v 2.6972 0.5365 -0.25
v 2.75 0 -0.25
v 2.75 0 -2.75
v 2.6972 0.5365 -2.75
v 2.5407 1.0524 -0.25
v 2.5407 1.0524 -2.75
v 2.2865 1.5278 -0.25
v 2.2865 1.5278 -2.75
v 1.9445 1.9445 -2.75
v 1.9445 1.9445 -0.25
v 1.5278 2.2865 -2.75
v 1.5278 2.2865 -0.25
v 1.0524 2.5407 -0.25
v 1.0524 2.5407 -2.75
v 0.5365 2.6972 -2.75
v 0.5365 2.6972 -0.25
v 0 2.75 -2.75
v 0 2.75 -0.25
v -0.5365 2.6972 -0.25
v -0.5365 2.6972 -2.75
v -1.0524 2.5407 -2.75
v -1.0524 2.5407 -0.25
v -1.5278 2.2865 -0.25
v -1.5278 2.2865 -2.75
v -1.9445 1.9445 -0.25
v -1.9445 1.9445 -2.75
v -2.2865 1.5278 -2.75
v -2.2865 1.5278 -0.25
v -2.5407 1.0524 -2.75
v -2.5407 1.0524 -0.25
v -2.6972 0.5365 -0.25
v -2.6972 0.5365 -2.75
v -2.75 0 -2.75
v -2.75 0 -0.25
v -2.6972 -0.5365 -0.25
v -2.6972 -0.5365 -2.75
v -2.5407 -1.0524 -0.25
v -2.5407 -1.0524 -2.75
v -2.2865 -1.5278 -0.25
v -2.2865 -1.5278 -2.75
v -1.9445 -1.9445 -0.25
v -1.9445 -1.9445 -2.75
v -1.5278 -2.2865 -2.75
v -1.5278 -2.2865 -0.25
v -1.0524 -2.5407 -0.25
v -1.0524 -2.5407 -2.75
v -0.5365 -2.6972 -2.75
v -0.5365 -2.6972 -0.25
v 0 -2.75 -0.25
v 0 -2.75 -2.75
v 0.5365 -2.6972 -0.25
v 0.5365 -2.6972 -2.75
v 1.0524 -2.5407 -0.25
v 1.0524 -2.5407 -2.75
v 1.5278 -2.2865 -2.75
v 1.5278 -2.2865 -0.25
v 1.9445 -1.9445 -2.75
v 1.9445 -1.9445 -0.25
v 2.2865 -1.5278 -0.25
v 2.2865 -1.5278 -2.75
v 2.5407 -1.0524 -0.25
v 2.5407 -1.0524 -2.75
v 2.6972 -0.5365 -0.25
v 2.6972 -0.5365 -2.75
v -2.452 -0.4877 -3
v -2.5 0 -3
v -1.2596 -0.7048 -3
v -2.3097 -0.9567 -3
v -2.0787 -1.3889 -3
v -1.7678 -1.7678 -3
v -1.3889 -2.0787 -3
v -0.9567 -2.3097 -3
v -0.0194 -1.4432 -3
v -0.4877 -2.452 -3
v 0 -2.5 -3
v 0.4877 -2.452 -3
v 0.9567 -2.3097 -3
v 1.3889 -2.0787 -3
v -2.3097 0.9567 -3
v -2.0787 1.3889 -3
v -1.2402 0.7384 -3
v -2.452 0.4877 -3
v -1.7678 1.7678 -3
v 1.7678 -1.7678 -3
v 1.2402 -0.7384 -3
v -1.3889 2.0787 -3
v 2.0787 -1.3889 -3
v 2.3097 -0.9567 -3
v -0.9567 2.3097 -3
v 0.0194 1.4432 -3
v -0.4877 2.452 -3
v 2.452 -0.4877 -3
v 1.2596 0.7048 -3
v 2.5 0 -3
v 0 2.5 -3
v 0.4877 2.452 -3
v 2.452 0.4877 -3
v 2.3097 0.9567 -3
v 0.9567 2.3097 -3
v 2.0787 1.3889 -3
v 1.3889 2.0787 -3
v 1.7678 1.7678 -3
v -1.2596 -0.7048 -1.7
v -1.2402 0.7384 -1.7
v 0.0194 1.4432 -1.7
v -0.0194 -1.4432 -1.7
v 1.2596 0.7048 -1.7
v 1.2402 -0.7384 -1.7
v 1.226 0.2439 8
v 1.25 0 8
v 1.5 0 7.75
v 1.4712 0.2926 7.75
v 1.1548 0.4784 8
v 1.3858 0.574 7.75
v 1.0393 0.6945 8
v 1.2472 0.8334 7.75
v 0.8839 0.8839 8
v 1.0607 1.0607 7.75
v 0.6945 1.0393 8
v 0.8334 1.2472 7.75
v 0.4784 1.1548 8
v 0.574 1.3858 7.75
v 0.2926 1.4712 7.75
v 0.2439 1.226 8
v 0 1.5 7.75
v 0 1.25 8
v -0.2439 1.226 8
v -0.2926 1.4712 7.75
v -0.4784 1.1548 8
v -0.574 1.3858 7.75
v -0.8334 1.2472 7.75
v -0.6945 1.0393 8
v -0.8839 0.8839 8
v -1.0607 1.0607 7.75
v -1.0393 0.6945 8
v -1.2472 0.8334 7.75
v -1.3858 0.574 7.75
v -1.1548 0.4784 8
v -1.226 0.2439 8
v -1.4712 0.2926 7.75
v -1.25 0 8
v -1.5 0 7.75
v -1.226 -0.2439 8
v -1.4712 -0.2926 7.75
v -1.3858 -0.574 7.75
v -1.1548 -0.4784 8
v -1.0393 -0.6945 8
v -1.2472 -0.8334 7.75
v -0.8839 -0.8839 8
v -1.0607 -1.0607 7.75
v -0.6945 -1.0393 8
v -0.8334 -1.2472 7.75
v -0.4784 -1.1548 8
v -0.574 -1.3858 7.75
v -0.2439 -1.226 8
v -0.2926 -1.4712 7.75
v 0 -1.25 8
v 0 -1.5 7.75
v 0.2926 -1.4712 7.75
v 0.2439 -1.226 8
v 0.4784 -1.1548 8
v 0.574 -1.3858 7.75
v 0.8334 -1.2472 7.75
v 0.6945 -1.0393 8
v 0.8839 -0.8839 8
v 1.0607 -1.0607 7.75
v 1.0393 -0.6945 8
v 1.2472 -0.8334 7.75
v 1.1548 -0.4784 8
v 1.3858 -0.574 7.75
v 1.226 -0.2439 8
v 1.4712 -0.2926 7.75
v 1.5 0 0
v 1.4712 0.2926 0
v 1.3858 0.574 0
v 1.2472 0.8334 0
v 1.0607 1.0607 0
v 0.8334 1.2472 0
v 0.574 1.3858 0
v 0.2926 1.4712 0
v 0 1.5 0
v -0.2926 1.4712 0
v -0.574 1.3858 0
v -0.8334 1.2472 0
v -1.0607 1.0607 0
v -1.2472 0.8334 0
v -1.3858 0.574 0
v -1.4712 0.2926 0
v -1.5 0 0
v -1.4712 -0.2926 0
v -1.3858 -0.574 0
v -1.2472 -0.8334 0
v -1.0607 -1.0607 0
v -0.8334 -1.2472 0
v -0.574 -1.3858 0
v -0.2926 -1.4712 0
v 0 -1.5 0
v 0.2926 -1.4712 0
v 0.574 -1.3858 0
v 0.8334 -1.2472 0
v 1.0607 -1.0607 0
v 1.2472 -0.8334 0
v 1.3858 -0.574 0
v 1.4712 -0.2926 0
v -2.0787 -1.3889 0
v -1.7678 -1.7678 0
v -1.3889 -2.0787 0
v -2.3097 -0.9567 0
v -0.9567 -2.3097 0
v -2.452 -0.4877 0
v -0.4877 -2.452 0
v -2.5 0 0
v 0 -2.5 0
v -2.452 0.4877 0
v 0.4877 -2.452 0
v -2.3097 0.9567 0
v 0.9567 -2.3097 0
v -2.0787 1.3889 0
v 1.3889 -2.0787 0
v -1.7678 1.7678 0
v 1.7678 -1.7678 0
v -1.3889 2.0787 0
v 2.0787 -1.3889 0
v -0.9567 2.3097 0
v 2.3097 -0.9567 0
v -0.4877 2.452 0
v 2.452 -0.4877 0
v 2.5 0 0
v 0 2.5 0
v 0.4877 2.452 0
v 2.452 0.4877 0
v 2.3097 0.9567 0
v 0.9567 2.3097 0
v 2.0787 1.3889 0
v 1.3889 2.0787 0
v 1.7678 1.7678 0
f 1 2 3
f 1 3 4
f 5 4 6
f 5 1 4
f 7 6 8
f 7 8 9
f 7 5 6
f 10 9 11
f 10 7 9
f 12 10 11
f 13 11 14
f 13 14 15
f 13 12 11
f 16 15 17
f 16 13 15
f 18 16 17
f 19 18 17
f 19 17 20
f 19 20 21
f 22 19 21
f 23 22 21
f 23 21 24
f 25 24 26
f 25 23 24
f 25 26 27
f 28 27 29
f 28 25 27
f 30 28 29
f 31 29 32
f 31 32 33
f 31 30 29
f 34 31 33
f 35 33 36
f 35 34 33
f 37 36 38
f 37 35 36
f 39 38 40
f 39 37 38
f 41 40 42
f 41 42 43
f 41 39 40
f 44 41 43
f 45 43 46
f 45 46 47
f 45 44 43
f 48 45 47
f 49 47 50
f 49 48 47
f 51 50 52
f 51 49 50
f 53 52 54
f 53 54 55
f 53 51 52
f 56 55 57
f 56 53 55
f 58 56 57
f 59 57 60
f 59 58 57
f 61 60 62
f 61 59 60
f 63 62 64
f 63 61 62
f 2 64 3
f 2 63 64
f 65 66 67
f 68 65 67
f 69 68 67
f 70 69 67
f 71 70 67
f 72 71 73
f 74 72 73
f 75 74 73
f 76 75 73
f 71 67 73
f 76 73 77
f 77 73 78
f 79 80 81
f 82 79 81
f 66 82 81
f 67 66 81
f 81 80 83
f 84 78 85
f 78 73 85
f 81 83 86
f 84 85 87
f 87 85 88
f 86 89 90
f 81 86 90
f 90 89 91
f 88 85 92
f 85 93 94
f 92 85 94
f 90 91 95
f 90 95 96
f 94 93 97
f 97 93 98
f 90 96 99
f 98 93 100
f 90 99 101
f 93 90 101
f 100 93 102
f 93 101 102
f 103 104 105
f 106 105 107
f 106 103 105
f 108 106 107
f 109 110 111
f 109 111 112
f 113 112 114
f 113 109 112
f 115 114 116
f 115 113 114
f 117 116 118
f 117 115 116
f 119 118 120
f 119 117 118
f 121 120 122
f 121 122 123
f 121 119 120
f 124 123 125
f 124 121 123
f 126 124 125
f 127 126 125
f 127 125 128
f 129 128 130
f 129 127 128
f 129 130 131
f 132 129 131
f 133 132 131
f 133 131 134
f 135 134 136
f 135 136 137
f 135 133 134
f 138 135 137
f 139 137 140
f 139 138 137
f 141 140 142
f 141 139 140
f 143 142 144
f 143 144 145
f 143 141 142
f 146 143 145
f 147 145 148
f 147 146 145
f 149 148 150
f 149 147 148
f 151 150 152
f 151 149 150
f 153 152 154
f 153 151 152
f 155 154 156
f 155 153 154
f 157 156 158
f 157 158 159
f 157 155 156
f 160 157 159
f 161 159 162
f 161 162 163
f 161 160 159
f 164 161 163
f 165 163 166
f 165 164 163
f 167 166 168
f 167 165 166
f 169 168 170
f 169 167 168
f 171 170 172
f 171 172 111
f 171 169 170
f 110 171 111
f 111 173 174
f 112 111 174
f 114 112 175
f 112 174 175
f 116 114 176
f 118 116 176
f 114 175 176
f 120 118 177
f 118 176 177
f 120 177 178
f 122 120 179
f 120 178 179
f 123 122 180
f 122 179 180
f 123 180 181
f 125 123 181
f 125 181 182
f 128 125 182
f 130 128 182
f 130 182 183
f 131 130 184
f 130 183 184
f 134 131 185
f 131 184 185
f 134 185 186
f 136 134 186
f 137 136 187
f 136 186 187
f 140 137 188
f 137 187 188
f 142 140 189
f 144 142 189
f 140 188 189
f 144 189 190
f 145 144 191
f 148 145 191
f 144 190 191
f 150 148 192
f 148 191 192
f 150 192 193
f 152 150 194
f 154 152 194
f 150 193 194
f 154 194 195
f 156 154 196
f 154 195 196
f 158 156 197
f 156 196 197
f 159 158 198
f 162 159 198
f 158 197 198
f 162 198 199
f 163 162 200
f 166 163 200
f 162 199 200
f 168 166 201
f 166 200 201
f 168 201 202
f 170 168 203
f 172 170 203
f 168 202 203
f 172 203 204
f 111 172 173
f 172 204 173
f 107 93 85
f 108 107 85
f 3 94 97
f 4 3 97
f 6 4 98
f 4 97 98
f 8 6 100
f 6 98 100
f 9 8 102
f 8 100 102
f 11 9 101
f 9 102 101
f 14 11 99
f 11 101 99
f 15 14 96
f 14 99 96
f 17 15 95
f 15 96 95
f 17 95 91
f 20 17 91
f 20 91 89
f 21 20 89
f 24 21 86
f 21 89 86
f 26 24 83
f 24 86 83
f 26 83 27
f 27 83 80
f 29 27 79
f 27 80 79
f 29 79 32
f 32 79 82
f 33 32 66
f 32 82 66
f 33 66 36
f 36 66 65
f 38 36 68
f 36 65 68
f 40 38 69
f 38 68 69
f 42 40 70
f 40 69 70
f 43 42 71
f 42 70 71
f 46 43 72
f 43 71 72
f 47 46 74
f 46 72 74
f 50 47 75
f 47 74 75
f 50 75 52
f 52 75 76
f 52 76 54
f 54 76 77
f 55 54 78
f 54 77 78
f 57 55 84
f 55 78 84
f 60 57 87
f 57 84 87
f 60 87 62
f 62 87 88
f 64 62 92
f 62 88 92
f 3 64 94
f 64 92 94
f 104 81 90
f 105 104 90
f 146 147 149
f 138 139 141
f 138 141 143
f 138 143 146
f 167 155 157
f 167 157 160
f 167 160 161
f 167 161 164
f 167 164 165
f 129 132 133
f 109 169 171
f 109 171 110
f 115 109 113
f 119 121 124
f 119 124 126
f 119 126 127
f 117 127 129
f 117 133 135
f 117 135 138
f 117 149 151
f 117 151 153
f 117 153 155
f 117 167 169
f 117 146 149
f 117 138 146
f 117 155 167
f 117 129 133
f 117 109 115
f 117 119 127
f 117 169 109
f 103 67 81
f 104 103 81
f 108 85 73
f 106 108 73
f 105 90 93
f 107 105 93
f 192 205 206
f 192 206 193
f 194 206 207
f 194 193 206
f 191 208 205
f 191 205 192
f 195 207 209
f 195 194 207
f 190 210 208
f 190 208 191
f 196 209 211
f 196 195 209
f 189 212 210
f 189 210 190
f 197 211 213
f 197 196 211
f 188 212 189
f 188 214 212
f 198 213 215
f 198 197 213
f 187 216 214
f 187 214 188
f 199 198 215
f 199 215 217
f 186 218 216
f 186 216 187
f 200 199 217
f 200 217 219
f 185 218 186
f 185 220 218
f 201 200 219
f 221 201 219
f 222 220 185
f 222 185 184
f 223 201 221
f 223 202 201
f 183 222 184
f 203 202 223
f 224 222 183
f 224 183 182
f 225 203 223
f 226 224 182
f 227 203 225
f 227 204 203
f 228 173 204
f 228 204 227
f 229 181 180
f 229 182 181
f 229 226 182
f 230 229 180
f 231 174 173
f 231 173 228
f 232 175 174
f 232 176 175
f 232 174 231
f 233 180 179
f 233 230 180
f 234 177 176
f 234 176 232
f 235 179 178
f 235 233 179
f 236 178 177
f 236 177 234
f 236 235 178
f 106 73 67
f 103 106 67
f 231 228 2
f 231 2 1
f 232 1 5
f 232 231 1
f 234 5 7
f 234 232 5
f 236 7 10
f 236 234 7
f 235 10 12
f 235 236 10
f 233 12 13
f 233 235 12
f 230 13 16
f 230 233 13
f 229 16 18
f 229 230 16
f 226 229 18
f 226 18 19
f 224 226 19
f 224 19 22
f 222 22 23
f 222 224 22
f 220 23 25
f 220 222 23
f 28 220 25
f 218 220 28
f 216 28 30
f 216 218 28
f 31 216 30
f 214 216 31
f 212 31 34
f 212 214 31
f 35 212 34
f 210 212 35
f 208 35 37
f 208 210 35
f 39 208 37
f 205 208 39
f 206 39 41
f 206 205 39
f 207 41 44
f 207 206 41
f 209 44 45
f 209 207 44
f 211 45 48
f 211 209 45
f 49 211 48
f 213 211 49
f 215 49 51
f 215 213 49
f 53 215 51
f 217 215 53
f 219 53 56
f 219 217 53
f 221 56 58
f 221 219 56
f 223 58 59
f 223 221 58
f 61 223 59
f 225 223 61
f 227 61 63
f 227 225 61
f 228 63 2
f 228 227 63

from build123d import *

# Parameters (mm, degrees)
F0_R     = 1.5
F1_DEPTH = 8
F2_R     = 2.75
F3_DEPTH = 3
F5_DEPTH = 1.3
F6_SIZE  = 0.25


with BuildPart() as f1:
    # F0 (on Top) → F1 (new body)
    with BuildSketch(Plane.XY):
        Circle(F0_R)
    extrude(amount=F1_DEPTH)

    # F2 (on Top) → F3 (join)
    with BuildSketch(Plane.XY):
        Circle(F2_R)
    extrude(amount=-F3_DEPTH)

    # F4 (on face) → F5 (cut)
    with BuildSketch(Plane(origin=(0, 0, -3), x_dir=(1, 0, 0), z_dir=(0, 0, -1))):
        Polygon((0.019386, -1.443245), (1.25958, -0.704834), (1.240194, 0.738412), (-0.019386, 1.443245), (-1.25958, 0.704834), (-1.240194, -0.738412), align=None)
    extrude(amount=-F5_DEPTH, mode=Mode.SUBTRACT)

    # F6
    f6_edges = [f1.edges().sort_by_distance(p)[0] for p in [
        (-2.75, 0, -3),
        (-2.75, 0, 0),
        (-1.5, 0, 8),
    ]]
    chamfer(f6_edges, length=F6_SIZE)


solid = f1.part
